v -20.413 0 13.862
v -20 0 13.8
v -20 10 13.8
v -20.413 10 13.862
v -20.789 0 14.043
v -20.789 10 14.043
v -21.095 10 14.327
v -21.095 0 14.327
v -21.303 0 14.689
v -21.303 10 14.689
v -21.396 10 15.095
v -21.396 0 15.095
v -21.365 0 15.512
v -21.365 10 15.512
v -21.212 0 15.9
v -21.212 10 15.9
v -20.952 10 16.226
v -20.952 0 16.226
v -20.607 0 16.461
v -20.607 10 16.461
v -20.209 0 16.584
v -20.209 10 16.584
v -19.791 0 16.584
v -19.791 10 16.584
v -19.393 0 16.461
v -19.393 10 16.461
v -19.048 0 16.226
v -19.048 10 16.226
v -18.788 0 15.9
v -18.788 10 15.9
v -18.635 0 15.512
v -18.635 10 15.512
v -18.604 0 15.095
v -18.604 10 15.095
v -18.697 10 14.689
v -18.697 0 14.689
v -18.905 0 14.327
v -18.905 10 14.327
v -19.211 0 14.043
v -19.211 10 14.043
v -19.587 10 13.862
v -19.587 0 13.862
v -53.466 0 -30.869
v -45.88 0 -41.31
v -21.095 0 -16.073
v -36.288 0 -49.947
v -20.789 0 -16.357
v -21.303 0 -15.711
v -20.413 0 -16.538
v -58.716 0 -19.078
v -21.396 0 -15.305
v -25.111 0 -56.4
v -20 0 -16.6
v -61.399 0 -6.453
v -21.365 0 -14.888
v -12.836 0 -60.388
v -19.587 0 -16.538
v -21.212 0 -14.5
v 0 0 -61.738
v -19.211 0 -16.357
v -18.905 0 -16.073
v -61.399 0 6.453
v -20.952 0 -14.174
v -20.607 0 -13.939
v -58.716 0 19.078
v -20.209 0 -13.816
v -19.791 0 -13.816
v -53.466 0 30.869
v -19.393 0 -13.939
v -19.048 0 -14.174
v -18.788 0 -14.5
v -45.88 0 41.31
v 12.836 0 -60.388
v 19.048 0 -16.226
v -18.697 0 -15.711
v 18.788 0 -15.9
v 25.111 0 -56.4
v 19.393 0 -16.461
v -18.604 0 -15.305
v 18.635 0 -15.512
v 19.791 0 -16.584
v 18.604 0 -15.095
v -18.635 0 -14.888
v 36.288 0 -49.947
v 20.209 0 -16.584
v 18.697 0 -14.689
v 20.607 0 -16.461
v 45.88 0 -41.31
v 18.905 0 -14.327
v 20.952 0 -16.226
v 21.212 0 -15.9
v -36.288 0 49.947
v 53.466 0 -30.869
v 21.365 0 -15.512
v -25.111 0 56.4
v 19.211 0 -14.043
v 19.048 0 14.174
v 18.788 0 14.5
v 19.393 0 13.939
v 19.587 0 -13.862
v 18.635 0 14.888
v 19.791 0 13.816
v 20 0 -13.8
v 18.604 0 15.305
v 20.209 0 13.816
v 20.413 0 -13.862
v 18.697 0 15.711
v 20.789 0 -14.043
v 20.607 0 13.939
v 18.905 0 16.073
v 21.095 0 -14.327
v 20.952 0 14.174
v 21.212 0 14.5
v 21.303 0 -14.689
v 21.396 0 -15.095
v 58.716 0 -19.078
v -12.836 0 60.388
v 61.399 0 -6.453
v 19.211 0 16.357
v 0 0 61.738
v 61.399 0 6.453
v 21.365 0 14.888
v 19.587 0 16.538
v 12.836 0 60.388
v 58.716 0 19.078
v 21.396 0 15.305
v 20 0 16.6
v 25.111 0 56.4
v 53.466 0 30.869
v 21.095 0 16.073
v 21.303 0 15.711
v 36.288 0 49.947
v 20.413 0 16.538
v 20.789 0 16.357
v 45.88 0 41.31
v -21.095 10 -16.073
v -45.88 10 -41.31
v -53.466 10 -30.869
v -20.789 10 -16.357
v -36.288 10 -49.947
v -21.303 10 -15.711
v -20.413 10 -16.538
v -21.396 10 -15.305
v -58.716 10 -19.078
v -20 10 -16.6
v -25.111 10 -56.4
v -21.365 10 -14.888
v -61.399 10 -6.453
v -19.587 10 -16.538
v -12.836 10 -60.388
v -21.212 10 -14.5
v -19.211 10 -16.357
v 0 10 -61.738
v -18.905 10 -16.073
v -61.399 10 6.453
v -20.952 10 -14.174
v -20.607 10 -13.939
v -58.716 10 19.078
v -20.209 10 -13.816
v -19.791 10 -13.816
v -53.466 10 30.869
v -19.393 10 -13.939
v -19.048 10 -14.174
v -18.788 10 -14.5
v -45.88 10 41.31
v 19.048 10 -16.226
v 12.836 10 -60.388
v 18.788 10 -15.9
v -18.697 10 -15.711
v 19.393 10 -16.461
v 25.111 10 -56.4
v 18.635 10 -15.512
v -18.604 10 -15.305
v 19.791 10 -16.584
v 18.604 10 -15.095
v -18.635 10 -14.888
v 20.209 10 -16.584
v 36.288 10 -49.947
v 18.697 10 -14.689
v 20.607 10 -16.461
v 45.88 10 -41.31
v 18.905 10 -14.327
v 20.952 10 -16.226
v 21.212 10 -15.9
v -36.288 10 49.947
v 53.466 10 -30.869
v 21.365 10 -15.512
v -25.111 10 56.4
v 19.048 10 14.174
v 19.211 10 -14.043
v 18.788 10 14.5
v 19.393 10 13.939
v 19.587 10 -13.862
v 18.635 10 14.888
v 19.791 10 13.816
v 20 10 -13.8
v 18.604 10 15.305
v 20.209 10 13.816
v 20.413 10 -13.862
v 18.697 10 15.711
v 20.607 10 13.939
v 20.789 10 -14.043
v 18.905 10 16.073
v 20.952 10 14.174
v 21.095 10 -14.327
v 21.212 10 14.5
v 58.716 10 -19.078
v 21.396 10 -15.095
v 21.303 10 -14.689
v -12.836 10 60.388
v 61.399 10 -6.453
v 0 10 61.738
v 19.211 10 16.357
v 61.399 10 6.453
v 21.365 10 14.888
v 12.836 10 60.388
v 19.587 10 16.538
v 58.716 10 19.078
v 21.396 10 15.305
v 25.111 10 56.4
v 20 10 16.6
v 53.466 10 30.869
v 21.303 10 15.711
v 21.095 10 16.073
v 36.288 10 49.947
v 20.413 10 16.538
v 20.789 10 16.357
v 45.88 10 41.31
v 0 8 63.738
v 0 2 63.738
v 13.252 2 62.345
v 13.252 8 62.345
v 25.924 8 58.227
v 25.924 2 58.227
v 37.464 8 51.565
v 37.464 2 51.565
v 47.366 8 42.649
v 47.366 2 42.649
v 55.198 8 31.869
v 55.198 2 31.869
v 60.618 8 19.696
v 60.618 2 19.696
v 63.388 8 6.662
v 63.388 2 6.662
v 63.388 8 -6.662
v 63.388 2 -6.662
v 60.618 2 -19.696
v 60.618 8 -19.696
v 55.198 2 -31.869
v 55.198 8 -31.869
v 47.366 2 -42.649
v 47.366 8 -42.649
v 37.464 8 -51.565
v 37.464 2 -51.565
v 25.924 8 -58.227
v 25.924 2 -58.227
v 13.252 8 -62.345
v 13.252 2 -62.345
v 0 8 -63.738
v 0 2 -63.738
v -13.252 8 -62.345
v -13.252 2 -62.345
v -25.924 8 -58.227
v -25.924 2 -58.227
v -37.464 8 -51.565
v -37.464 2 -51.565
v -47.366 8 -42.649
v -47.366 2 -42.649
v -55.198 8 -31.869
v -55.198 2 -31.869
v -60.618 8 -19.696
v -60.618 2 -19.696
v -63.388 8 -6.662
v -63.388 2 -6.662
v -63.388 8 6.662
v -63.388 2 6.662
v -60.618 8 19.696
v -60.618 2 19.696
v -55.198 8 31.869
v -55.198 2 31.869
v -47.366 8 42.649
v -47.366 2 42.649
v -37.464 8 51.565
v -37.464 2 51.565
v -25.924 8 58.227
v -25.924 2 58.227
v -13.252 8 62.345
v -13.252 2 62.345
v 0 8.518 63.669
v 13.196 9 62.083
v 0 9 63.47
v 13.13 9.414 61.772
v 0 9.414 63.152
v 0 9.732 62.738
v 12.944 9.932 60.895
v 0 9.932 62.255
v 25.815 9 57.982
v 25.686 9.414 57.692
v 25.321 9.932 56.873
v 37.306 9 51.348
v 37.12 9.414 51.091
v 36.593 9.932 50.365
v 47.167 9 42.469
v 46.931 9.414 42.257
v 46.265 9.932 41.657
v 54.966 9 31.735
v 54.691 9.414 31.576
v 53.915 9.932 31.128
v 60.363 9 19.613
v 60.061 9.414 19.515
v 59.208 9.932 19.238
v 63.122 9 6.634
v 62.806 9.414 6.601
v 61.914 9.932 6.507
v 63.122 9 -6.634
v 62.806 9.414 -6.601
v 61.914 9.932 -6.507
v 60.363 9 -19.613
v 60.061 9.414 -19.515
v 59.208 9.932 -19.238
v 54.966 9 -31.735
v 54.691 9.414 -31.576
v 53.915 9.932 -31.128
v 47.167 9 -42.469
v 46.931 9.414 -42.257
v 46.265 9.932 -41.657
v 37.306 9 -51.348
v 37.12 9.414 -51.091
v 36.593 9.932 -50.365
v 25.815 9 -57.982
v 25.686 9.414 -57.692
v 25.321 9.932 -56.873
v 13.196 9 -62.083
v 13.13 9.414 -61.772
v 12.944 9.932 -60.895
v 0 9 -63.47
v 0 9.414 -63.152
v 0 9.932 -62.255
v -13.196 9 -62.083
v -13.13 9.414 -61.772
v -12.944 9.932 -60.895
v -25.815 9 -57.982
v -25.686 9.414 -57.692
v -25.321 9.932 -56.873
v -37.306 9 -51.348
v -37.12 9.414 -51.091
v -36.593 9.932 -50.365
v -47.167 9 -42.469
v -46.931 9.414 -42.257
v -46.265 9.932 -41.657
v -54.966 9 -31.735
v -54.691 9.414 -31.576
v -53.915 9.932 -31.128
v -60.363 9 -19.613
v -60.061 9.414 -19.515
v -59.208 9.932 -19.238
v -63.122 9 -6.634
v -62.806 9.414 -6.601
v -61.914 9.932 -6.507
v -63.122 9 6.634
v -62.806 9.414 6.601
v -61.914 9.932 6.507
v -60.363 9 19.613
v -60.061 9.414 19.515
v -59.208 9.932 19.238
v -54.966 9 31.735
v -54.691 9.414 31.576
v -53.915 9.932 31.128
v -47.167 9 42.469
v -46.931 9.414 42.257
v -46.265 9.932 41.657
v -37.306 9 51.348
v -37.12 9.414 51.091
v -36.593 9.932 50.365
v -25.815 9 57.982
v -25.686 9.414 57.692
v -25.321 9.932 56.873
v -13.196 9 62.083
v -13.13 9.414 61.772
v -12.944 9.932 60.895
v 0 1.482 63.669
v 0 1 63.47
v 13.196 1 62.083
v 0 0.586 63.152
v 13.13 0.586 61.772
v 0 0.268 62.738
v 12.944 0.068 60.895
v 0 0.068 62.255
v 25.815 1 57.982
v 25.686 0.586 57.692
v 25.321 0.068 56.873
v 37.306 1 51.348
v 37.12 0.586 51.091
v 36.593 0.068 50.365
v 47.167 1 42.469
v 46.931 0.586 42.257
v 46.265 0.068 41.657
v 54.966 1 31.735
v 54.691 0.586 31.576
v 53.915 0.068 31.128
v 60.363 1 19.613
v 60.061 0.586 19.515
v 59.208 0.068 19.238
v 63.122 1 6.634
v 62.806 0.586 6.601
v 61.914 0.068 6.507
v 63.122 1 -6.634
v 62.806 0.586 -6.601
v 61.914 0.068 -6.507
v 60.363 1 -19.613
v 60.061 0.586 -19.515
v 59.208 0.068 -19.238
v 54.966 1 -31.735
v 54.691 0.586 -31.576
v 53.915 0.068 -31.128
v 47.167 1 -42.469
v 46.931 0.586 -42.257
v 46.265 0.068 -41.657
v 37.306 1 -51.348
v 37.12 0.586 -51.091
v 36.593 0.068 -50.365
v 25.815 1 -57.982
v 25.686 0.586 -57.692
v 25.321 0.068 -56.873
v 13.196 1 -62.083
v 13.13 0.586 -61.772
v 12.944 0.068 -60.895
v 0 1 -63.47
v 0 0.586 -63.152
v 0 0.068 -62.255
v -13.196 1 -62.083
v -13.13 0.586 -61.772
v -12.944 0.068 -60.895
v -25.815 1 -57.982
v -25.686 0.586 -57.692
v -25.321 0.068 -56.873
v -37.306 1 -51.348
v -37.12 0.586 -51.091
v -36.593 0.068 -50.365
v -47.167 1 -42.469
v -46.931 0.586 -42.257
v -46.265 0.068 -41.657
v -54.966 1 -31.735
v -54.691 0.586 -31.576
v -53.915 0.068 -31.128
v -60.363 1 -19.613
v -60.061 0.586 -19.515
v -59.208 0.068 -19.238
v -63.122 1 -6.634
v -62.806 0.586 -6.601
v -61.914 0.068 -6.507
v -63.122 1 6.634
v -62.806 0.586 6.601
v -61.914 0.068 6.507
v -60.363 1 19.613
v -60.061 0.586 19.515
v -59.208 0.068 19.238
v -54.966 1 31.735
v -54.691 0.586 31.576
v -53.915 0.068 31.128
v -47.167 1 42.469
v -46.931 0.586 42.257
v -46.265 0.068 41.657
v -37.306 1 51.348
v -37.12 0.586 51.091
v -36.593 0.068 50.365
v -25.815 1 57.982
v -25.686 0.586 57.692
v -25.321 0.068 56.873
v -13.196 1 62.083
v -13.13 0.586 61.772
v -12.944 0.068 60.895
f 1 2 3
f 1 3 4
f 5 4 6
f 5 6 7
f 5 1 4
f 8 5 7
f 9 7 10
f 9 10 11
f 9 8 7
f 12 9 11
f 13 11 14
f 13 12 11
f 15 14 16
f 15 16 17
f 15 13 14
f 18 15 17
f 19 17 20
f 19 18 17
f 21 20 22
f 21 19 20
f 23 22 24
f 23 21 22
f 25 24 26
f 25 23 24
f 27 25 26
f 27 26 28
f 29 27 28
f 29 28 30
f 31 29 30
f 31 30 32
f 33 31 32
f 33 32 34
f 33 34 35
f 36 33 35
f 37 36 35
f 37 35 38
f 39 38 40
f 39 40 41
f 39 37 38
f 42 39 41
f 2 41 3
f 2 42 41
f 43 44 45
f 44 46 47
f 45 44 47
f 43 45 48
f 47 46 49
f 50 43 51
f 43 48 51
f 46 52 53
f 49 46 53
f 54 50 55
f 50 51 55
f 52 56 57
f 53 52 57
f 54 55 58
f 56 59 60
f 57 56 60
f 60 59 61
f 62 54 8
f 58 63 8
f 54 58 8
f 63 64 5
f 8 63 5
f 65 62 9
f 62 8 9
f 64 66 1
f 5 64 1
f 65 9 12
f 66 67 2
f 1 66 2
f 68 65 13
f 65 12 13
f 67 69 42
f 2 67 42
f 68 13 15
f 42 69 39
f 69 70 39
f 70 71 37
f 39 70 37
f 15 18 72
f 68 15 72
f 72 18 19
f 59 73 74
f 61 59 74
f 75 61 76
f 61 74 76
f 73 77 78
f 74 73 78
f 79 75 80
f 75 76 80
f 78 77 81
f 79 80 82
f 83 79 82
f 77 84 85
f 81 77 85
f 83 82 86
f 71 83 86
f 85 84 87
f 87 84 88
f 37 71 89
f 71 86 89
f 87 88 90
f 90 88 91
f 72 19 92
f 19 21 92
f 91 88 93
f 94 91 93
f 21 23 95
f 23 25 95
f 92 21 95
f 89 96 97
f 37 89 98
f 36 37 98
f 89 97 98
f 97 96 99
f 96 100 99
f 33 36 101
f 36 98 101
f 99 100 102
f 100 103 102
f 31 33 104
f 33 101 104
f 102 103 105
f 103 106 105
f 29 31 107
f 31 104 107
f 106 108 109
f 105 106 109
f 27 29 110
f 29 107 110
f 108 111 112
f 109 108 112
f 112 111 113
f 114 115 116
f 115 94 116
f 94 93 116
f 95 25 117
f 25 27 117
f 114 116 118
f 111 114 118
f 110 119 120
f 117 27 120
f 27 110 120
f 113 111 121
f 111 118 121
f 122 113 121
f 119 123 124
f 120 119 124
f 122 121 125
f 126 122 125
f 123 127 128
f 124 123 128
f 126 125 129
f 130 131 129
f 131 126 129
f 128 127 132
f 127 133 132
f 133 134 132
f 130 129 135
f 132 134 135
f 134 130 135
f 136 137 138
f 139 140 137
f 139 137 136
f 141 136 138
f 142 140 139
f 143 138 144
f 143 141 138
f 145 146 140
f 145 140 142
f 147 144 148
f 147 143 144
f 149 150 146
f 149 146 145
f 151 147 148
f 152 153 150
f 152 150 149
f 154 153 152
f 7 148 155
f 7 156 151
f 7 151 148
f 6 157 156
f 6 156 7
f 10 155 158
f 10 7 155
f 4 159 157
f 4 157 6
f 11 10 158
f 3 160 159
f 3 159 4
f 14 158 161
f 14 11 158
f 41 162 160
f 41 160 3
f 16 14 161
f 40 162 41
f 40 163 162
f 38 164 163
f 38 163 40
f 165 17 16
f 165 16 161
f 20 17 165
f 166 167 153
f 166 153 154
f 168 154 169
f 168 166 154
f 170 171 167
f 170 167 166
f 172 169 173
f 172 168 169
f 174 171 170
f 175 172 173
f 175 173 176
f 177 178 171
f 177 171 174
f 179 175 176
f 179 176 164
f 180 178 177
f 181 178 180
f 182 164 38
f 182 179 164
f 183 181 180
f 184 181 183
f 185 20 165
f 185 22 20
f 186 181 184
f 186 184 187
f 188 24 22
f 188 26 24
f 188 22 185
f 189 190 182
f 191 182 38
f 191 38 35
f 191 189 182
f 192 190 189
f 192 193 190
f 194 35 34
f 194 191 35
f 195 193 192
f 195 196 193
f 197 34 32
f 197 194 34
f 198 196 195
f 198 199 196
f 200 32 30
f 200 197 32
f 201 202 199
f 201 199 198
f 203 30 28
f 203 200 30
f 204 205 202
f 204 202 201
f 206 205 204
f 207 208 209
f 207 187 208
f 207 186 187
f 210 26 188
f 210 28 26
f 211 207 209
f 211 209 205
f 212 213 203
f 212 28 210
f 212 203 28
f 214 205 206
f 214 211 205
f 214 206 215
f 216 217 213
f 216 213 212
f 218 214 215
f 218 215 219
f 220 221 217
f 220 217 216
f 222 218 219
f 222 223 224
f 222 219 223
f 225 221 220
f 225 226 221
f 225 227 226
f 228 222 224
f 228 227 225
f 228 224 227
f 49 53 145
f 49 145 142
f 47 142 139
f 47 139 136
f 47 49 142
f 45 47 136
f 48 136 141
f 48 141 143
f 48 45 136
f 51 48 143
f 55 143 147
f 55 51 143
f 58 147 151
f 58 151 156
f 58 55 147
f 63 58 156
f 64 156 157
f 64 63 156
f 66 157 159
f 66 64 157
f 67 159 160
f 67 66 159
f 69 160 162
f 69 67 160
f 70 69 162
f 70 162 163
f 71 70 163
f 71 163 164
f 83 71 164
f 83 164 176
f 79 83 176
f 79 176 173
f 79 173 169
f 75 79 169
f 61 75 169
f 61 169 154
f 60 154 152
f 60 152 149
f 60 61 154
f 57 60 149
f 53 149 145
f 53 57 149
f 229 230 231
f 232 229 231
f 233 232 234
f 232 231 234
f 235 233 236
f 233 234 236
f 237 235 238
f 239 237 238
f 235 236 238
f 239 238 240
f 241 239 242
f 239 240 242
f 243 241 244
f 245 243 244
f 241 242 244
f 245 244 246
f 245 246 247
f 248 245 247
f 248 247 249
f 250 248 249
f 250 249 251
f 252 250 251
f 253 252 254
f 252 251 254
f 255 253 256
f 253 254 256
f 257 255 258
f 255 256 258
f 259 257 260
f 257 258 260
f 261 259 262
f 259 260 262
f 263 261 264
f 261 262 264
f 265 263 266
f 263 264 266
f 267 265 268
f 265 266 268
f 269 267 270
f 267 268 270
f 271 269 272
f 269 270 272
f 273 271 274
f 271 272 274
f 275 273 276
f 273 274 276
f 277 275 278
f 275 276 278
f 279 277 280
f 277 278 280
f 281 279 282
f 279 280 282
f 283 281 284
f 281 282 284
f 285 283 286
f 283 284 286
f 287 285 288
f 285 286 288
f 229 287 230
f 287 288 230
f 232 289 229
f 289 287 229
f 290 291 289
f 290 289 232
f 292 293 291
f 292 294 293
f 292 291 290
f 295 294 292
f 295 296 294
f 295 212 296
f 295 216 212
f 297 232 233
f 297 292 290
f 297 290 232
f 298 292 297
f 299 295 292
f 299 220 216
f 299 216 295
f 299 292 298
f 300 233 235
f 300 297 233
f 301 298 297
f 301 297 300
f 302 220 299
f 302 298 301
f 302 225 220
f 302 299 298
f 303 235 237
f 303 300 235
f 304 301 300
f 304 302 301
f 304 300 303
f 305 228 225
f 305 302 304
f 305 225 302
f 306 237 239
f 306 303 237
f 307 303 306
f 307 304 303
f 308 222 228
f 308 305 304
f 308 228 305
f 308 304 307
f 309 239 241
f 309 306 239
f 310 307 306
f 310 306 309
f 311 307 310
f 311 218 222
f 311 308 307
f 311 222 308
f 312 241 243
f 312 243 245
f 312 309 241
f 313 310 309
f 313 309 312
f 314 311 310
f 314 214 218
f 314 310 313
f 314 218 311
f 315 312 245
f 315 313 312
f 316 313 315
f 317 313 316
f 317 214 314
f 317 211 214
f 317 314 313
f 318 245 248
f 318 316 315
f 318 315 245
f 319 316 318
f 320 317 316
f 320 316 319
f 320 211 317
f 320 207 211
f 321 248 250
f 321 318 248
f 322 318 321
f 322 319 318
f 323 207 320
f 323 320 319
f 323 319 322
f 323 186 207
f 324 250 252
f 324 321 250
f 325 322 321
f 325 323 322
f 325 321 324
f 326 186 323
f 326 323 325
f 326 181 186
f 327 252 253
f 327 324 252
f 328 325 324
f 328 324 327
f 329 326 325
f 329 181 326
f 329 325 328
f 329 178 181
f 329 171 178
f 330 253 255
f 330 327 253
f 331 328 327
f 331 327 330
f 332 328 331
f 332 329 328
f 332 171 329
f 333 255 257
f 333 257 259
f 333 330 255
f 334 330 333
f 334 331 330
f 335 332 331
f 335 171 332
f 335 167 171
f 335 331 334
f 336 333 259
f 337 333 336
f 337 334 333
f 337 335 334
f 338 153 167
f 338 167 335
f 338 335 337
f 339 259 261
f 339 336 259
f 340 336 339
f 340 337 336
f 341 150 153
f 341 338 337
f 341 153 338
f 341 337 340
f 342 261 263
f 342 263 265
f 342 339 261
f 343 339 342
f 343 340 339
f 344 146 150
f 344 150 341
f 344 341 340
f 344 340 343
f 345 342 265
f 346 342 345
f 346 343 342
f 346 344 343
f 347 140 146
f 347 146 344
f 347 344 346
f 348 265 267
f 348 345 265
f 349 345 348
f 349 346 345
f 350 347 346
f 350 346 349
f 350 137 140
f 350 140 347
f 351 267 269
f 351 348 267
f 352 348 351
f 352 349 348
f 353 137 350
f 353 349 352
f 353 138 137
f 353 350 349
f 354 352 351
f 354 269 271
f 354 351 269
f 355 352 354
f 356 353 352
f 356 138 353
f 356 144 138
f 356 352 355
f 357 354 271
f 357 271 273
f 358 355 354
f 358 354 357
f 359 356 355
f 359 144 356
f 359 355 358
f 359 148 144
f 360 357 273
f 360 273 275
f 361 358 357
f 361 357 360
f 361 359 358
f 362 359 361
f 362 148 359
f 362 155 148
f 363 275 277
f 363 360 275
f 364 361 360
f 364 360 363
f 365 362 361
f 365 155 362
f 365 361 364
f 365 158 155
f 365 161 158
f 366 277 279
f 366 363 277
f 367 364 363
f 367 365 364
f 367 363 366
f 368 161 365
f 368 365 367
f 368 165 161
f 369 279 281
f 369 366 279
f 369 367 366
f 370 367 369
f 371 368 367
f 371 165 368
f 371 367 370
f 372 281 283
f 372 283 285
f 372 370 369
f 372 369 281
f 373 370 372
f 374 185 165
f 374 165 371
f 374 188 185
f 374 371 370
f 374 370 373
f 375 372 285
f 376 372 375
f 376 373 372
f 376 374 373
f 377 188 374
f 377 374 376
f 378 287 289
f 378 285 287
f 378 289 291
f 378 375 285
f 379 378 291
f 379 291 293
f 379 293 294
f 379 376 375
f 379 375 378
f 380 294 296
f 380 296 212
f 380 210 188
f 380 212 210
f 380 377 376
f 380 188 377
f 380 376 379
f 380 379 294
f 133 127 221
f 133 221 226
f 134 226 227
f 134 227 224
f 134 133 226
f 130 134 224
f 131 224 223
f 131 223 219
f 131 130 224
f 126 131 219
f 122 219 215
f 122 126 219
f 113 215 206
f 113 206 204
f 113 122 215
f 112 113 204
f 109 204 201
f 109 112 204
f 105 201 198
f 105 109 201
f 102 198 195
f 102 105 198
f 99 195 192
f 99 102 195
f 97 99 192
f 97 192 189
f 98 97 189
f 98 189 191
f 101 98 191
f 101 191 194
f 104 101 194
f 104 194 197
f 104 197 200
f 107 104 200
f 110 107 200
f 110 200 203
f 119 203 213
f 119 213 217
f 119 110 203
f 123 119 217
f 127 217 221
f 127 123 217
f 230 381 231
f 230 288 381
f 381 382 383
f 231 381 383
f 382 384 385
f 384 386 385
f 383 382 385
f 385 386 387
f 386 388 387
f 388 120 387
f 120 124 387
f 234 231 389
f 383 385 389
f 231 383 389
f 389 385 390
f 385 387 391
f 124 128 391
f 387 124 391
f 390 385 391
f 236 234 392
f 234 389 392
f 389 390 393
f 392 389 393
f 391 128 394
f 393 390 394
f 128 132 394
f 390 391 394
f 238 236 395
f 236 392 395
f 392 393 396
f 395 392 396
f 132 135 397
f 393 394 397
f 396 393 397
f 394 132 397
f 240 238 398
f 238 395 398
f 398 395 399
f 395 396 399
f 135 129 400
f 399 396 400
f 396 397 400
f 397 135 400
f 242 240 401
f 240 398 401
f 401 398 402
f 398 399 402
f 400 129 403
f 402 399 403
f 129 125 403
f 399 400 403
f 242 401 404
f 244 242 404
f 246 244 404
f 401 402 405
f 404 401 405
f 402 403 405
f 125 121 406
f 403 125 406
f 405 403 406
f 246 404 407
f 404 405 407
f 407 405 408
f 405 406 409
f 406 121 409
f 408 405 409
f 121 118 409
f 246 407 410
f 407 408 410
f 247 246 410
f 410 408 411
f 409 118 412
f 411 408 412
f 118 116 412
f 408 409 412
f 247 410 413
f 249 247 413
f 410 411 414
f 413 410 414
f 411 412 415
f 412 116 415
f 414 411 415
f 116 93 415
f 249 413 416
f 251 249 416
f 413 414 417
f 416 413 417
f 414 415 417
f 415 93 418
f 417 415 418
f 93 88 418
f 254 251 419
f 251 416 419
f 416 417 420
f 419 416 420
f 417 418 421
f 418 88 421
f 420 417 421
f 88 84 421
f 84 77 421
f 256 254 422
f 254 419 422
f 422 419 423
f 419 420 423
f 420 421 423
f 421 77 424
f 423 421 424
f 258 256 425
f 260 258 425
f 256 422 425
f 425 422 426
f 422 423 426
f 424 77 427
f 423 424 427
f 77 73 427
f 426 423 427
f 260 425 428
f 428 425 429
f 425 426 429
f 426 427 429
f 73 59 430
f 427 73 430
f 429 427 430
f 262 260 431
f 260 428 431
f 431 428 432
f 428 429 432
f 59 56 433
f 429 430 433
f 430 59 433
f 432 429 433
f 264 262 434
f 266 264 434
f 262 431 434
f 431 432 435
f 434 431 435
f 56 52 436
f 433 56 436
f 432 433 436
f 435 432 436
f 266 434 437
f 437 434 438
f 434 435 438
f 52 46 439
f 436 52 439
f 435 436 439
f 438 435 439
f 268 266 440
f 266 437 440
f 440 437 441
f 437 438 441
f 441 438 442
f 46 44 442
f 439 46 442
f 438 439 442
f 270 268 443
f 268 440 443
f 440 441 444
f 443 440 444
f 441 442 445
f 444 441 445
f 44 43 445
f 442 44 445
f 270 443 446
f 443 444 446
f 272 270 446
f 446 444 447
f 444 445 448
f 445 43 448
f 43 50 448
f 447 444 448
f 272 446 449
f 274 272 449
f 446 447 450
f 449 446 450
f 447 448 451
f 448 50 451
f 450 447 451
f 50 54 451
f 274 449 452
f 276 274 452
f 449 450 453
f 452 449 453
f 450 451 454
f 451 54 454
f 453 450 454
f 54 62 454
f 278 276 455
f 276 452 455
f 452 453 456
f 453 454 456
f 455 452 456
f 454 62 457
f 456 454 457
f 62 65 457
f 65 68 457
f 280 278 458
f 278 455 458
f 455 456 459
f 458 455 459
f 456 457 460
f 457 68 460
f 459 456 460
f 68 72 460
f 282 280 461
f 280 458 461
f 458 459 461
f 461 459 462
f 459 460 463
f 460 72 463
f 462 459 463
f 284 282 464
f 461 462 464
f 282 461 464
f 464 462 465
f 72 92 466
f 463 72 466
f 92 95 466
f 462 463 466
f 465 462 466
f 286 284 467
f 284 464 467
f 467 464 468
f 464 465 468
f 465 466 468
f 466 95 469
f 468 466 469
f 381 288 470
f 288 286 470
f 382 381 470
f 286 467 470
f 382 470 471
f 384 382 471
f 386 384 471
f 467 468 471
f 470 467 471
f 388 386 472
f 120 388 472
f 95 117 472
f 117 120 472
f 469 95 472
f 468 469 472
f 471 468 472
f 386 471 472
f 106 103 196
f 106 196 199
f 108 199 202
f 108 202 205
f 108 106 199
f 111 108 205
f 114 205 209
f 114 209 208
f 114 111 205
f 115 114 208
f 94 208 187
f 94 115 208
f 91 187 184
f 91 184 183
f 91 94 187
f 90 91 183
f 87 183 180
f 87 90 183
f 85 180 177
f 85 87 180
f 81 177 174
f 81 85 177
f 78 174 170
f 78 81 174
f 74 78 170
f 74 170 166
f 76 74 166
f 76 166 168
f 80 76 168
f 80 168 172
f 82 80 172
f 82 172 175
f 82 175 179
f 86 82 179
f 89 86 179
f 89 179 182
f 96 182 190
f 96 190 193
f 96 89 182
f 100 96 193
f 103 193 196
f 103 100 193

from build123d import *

# Parameters (mm, degrees)
SKETCH1_R           = 63.737542135
SKETCH1_R_2         = 1.4
BOSS_EXTRUDE1_DEPTH = 10
FILLET1_R           = 2
FILLET2_R           = 2


with BuildPart() as part:
    # Sketch1 → Boss-Extrude1 (new body)
    with BuildSketch(Plane(origin=(0, 0, 0), x_dir=(1, 0, 0), z_dir=(0, 1, 0))):
        with Locations(Location((0, 0, 0), (0, 0, 270))):
            Circle(SKETCH1_R)
        with Locations(Location((20, 15.2, 0), (0, 0, 270))):
            Circle(SKETCH1_R_2, mode=Mode.SUBTRACT)
        with Locations(Location((20, -15.2, 0), (0, 0, 270))):
            Circle(SKETCH1_R_2, mode=Mode.SUBTRACT)
        with Locations(Location((-20, -15.2, 0), (0, 0, 90))):
            Circle(SKETCH1_R_2, mode=Mode.SUBTRACT)
        with Locations(Location((-20, 15.2, 0), (0, 0, 90))):
            Circle(SKETCH1_R_2, mode=Mode.SUBTRACT)
    extrude(amount=BOSS_EXTRUDE1_DEPTH)

    # Fillet1
    fillet1_edges = [part.edges().sort_by_distance(p)[0] for p in [
        (0, 0, -63.737542135),
    ]]
    fillet(fillet1_edges, radius=FILLET1_R)

    # Fillet2
    fillet2_edges = [part.edges().sort_by_distance(p)[0] for p in [
        (0, 10, -63.737542135),
    ]]
    fillet(fillet2_edges, radius=FILLET2_R)


solid = part.part
